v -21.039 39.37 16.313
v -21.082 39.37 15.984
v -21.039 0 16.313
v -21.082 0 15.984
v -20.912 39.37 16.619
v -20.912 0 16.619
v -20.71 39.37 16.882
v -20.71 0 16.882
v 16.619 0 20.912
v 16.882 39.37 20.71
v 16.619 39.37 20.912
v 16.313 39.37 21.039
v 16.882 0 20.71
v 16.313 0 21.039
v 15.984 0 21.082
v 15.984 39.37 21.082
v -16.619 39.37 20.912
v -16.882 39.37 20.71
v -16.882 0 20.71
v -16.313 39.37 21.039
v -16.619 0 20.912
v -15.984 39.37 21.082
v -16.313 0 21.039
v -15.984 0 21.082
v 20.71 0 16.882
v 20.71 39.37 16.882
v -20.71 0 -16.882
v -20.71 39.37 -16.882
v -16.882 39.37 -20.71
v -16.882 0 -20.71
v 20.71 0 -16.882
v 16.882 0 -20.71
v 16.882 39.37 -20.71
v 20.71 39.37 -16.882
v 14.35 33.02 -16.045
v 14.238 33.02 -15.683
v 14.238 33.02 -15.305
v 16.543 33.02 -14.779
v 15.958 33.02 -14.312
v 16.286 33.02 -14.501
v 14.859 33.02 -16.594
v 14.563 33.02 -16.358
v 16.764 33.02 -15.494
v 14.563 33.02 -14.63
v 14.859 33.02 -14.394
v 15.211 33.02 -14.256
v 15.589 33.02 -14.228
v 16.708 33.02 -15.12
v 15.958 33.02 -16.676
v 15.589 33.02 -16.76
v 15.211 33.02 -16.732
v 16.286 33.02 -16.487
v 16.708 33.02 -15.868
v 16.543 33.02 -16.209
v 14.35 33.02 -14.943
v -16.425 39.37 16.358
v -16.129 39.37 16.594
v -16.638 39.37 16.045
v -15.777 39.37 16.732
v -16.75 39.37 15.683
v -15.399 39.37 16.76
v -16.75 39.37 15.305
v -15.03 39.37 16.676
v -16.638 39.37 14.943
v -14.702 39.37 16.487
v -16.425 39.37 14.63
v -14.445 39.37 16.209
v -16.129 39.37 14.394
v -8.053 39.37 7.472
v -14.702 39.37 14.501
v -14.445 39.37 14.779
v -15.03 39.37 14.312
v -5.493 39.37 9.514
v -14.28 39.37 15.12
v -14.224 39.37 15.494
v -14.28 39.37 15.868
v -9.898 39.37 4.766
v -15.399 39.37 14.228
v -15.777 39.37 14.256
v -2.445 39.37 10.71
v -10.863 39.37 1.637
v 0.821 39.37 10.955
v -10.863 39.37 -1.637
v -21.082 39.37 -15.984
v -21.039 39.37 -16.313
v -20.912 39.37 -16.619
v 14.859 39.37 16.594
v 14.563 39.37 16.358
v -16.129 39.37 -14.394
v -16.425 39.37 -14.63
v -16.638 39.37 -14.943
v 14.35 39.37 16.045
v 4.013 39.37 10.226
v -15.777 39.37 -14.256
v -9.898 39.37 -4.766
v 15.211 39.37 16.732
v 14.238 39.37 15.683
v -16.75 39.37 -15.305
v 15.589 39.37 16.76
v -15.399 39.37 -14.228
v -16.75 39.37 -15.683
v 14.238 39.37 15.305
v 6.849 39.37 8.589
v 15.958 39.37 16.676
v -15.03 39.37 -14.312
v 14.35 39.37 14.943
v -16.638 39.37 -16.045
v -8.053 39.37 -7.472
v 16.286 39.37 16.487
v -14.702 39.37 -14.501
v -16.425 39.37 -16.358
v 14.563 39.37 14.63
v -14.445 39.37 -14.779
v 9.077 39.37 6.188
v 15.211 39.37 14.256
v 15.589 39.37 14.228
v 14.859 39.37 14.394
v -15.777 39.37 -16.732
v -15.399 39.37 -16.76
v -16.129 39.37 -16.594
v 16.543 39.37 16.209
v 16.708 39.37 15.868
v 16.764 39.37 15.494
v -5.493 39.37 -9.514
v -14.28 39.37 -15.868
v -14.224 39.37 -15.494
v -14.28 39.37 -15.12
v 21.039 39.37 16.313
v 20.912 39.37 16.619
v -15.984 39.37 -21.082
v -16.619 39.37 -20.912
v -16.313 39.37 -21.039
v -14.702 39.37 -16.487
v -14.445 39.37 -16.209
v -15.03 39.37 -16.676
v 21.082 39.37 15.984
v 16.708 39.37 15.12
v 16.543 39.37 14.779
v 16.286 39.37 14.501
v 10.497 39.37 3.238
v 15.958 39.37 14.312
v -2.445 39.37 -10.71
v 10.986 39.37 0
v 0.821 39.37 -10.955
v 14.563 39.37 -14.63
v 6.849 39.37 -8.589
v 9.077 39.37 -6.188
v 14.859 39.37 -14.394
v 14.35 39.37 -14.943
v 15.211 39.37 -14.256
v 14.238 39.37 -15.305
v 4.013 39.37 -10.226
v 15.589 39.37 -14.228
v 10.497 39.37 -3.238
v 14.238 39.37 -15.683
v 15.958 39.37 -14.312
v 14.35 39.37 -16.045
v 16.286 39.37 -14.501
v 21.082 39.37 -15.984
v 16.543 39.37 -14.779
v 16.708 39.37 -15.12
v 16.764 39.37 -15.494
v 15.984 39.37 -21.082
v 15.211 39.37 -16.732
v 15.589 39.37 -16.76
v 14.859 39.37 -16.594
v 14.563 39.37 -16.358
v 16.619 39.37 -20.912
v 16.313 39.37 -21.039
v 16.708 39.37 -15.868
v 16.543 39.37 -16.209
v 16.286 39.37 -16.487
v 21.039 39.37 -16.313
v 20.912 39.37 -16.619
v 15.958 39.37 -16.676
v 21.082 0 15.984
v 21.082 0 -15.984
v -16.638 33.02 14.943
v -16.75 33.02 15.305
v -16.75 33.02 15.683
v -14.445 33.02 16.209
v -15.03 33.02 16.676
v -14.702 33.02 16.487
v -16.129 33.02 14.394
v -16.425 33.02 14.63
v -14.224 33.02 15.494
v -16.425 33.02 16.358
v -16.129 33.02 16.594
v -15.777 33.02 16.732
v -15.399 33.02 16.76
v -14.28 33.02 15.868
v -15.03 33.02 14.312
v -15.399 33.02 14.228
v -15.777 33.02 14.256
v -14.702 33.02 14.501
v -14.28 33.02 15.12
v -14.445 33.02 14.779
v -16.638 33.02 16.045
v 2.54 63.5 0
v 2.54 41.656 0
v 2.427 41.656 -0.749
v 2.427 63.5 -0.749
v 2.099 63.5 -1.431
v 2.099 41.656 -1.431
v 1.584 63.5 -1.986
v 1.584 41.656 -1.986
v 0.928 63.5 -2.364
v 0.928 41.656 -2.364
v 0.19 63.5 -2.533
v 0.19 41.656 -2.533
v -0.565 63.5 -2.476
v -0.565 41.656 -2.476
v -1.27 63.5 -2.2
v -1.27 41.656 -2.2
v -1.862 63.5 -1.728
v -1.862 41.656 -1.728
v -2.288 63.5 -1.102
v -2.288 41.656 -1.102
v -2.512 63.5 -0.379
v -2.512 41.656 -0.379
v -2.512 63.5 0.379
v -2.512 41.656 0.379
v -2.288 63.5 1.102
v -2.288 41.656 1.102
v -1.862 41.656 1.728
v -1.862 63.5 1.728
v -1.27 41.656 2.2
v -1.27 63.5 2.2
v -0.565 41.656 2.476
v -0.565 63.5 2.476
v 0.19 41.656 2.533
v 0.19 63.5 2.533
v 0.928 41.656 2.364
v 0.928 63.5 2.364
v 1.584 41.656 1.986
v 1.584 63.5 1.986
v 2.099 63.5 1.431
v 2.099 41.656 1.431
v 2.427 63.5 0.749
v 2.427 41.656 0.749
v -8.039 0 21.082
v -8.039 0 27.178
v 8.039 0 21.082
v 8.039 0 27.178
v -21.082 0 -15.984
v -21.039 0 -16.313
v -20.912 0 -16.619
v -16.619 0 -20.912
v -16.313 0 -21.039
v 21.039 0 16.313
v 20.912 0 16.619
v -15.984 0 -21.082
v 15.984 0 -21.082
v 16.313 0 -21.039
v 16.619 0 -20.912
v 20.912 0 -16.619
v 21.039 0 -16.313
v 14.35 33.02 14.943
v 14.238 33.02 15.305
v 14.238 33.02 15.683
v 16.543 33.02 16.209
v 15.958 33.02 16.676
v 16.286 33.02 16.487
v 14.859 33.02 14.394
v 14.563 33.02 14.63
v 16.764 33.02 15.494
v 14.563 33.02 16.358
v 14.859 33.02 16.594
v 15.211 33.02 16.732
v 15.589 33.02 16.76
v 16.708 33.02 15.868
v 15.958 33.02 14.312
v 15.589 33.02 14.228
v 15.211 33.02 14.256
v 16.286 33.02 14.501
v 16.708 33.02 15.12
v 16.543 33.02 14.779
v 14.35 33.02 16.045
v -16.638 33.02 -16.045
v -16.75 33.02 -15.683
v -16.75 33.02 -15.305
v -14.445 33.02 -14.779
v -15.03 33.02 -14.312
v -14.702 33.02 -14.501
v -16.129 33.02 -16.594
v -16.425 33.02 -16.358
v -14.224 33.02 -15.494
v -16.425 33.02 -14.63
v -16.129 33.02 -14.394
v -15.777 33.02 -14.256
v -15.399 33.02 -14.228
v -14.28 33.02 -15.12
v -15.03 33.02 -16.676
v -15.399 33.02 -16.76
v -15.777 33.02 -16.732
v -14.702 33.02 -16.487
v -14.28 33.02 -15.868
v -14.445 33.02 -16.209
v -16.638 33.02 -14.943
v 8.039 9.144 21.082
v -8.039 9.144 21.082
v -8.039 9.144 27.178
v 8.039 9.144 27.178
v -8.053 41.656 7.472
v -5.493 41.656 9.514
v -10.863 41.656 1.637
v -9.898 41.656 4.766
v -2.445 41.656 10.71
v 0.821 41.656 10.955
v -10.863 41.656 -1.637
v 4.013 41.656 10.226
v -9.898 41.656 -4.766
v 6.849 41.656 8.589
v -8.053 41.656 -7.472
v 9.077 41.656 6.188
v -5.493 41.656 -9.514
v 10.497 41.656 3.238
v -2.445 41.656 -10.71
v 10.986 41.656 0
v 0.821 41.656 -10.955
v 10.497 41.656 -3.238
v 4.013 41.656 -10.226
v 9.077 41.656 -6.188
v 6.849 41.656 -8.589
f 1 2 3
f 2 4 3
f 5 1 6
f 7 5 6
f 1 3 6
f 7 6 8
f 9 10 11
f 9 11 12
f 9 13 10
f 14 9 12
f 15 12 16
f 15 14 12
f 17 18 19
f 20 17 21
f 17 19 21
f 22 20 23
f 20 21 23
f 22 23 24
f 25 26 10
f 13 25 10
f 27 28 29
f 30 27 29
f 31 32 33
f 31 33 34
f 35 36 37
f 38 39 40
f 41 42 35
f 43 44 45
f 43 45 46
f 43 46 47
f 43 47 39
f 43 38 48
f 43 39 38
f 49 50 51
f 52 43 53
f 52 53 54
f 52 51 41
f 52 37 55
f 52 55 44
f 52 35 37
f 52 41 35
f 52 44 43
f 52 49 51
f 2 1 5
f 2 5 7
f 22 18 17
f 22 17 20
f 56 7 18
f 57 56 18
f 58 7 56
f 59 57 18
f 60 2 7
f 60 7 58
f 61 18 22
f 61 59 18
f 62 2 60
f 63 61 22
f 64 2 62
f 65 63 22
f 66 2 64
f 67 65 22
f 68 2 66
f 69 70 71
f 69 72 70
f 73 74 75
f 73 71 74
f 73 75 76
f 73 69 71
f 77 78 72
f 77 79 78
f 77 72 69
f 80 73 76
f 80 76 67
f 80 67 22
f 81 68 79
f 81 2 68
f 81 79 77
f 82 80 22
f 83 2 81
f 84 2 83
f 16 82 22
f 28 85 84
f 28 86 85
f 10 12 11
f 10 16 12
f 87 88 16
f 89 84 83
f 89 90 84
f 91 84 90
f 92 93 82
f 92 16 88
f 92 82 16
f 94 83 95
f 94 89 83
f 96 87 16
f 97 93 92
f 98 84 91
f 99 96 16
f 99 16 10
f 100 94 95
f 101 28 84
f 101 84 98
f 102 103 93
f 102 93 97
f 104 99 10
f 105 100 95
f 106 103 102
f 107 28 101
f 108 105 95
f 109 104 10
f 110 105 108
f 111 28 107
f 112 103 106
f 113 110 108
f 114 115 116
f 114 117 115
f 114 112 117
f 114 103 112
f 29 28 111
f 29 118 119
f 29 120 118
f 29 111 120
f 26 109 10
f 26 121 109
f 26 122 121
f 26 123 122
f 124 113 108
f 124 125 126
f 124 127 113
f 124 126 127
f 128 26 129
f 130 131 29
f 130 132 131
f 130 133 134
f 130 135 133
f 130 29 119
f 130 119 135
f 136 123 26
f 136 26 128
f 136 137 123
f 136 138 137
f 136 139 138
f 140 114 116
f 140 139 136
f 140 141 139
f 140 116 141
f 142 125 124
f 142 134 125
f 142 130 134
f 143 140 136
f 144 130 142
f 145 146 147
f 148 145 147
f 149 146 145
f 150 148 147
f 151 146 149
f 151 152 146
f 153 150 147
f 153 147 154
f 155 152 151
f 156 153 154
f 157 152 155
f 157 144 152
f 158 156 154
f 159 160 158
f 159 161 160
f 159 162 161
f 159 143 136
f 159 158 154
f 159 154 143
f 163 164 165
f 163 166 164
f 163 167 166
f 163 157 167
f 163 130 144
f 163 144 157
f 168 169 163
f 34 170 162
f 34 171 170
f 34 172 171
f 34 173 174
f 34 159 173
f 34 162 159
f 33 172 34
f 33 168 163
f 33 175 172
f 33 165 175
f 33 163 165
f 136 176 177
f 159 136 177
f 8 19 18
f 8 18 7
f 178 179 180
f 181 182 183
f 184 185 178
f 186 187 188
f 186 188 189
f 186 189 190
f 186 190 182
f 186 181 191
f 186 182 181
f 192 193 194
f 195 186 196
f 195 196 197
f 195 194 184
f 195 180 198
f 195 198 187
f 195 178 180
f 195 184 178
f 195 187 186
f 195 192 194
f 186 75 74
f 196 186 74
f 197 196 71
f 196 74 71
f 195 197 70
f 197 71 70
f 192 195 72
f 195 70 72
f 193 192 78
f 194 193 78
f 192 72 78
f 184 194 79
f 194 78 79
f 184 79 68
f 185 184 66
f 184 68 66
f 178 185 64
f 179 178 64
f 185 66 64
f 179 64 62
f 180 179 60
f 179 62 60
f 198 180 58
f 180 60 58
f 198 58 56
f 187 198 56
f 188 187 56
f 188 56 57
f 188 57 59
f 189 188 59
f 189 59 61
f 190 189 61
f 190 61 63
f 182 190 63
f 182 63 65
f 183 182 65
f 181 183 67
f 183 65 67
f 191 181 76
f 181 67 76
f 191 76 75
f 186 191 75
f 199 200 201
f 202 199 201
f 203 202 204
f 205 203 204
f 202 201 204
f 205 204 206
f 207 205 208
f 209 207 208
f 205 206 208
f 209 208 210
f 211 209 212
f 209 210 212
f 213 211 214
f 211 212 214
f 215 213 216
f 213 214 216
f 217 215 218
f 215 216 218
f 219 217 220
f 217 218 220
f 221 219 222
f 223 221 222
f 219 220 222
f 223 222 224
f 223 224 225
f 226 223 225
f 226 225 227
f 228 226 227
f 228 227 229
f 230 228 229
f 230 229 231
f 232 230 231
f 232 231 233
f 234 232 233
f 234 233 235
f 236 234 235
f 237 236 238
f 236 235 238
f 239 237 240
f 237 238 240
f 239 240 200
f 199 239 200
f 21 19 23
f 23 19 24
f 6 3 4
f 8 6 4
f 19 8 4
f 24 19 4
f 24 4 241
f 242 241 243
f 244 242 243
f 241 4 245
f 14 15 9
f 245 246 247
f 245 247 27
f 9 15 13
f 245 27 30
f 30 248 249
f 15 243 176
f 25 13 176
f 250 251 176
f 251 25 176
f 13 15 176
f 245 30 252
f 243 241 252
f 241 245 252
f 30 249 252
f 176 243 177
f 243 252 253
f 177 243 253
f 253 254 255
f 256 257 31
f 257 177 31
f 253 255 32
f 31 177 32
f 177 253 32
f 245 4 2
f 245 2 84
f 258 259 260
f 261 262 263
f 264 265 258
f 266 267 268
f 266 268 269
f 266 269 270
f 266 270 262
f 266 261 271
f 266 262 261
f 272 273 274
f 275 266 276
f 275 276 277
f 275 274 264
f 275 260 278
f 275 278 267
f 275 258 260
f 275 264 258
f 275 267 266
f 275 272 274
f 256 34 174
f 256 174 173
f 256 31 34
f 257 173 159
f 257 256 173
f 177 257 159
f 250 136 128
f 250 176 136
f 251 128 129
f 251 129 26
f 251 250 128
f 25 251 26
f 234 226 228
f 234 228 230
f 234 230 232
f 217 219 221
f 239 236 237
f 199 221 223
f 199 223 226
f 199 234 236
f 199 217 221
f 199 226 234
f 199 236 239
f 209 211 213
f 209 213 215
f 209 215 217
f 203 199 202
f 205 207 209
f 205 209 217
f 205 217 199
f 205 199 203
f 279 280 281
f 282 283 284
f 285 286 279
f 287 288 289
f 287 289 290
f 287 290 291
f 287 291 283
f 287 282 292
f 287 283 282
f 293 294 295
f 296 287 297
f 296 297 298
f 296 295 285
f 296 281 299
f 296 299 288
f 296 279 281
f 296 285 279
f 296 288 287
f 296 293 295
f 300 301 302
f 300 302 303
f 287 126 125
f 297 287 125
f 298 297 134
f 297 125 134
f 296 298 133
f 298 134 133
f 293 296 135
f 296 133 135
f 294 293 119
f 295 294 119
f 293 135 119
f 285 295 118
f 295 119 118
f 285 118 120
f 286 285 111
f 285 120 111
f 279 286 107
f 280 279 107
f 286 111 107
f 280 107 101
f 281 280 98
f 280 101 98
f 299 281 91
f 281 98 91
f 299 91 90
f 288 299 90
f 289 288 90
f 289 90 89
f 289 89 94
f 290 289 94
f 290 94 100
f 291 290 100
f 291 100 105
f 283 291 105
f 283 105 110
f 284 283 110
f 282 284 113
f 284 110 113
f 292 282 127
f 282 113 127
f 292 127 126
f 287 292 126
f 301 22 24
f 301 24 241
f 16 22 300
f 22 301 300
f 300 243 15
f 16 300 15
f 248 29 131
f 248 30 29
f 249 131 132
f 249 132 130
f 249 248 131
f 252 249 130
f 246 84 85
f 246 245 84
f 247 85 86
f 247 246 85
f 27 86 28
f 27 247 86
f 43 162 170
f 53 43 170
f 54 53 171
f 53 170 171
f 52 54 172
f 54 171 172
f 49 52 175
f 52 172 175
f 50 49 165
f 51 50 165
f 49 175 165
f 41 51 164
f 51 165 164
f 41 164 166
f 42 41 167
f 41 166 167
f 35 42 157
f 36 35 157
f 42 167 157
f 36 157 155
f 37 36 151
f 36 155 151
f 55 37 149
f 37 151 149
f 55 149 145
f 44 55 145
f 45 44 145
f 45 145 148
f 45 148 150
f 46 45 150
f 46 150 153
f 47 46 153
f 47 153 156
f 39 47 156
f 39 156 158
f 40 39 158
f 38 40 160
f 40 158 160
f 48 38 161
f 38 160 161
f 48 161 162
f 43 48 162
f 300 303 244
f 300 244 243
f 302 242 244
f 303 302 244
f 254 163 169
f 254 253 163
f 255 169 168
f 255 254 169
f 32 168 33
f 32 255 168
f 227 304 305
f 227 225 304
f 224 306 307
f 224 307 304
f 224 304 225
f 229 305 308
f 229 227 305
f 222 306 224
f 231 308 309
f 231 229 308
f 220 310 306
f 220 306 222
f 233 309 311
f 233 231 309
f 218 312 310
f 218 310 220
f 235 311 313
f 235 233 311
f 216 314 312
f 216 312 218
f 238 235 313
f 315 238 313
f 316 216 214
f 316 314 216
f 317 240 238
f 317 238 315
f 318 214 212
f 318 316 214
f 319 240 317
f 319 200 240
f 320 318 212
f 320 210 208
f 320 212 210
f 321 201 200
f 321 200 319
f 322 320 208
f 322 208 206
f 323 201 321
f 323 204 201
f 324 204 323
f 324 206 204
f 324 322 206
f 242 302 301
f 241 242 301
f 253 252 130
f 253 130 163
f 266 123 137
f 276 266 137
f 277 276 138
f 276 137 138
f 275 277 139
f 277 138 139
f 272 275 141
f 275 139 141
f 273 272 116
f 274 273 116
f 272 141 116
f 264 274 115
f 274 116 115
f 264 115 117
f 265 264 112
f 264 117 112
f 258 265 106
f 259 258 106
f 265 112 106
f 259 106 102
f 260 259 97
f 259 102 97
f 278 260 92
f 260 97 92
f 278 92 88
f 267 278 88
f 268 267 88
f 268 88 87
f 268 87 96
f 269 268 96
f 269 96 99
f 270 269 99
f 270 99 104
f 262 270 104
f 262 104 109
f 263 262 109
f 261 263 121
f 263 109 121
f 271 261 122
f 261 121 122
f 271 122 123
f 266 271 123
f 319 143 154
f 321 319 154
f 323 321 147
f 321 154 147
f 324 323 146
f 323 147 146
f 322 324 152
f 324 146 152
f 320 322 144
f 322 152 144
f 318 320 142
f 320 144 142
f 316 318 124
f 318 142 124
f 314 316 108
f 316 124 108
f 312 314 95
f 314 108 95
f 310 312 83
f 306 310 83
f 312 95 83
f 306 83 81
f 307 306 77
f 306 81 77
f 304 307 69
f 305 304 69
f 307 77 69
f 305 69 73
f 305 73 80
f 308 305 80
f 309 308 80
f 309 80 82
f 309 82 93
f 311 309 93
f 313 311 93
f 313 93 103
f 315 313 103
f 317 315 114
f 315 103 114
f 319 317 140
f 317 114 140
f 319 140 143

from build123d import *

# Parameters (mm, degrees)
BOSS_EXTRUDE1_DEPTH = 39.37
SKETCH1_3_W         = 16.0782
SKETCH1_3_H         = 6.096
BOSS_EXTRUDE2_DEPTH = 9.144
SKETCH2_R           = 10.9855
BOSS_EXTRUDE3_DEPTH = 2.286
SKETCH3_R           = 2.54
BOSS_EXTRUDE4_DEPTH = 21.844
SKETCH4_R           = 1.27
CUT_EXTRUDE1_DEPTH  = 6.35
CUT_EXTRUDE2_DEPTH  = 53.278975774
FILLET1_R           = 1.27


with BuildPart() as part:
    # Sketch1 → Boss-Extrude1 (new body)
    with BuildSketch(Plane(origin=(0, 0, 0), x_dir=(1, 0, 0), z_dir=(0, 1, 0))):
        Polygon((-21.082, 21.082), (-21.082, -21.082), (-8.0391, -21.082), (8.0391, -21.082), (21.082, -21.082), (21.082, 21.082), align=None)
    extrude(amount=BOSS_EXTRUDE1_DEPTH)

    # Sketch1<3> → Boss-Extrude2 (add)
    with BuildSketch(Plane(origin=(0, 0, 0), x_dir=(1, 0, 0), z_dir=(0, 1, 0))):
        with Locations((0, -24.13)):
            Rectangle(SKETCH1_3_W, SKETCH1_3_H)
    extrude(amount=BOSS_EXTRUDE2_DEPTH)

    # Sketch2 → Boss-Extrude3 (add)
    with BuildSketch(Plane(origin=(0, 39.37, 0), x_dir=(1, 0, 0), z_dir=(0, 1, 0))):
        Circle(SKETCH2_R)
    extrude(amount=BOSS_EXTRUDE3_DEPTH)

    # Sketch3 → Boss-Extrude4 (add)
    with BuildSketch(Plane(origin=(0, 41.656, 0), x_dir=(1, 0, 0), z_dir=(0, 1, 0))):
        Circle(SKETCH3_R)
    extrude(amount=BOSS_EXTRUDE4_DEPTH)

    # Sketch4 → Cut-Extrude1 (cut)
    with BuildSketch(Plane(origin=(0, 39.37, 0), x_dir=(1, 0, 0), z_dir=(0, 1, 0))):
        with Locations((-15.494, 15.494)):
            Circle(SKETCH4_R)
        with Locations((15.494, 15.494)):
            Circle(SKETCH4_R)
        with Locations((15.494, -15.494)):
            Circle(SKETCH4_R)
        with Locations((-15.494, -15.494)):
            Circle(SKETCH4_R)
    extrude(amount=-CUT_EXTRUDE1_DEPTH, mode=Mode.SUBTRACT)

    # Sketch5 → Cut-Extrude2 (cut, through all)
    with BuildSketch(Plane(origin=(0, 39.37, 0), x_dir=(1, 0, 0), z_dir=(0, 1, 0))):
        Polygon((-21.082, 16.51), (-16.51, 21.082), (-21.082, 21.082), align=None)
        Polygon((16.51, 21.082), (21.082, 16.51), (21.082, 21.082), align=None)
        Polygon((21.082, -16.51), (16.51, -21.082), (21.082, -21.082), align=None)
        Polygon((-16.51, -21.082), (-21.082, -16.51), (-21.082, -21.082), align=None)
    extrude(amount=-CUT_EXTRUDE2_DEPTH, mode=Mode.SUBTRACT)

    # Fillet1
    fillet1_edges = [part.edges().sort_by_distance(p)[0] for p in [
        (-21.082, 19.685, -16.51),
        (-16.51, 19.685, -21.082),
        (16.51, 19.685, -21.082),
        (21.082, 19.685, -16.51),
        (21.082, 19.685, 16.51),
        (16.51, 19.685, 21.082),
        (-21.082, 19.685, 16.51),
        (-16.51, 19.685, 21.082),
    ]]
    fillet(fillet1_edges, radius=FILLET1_R)


solid = part.part
